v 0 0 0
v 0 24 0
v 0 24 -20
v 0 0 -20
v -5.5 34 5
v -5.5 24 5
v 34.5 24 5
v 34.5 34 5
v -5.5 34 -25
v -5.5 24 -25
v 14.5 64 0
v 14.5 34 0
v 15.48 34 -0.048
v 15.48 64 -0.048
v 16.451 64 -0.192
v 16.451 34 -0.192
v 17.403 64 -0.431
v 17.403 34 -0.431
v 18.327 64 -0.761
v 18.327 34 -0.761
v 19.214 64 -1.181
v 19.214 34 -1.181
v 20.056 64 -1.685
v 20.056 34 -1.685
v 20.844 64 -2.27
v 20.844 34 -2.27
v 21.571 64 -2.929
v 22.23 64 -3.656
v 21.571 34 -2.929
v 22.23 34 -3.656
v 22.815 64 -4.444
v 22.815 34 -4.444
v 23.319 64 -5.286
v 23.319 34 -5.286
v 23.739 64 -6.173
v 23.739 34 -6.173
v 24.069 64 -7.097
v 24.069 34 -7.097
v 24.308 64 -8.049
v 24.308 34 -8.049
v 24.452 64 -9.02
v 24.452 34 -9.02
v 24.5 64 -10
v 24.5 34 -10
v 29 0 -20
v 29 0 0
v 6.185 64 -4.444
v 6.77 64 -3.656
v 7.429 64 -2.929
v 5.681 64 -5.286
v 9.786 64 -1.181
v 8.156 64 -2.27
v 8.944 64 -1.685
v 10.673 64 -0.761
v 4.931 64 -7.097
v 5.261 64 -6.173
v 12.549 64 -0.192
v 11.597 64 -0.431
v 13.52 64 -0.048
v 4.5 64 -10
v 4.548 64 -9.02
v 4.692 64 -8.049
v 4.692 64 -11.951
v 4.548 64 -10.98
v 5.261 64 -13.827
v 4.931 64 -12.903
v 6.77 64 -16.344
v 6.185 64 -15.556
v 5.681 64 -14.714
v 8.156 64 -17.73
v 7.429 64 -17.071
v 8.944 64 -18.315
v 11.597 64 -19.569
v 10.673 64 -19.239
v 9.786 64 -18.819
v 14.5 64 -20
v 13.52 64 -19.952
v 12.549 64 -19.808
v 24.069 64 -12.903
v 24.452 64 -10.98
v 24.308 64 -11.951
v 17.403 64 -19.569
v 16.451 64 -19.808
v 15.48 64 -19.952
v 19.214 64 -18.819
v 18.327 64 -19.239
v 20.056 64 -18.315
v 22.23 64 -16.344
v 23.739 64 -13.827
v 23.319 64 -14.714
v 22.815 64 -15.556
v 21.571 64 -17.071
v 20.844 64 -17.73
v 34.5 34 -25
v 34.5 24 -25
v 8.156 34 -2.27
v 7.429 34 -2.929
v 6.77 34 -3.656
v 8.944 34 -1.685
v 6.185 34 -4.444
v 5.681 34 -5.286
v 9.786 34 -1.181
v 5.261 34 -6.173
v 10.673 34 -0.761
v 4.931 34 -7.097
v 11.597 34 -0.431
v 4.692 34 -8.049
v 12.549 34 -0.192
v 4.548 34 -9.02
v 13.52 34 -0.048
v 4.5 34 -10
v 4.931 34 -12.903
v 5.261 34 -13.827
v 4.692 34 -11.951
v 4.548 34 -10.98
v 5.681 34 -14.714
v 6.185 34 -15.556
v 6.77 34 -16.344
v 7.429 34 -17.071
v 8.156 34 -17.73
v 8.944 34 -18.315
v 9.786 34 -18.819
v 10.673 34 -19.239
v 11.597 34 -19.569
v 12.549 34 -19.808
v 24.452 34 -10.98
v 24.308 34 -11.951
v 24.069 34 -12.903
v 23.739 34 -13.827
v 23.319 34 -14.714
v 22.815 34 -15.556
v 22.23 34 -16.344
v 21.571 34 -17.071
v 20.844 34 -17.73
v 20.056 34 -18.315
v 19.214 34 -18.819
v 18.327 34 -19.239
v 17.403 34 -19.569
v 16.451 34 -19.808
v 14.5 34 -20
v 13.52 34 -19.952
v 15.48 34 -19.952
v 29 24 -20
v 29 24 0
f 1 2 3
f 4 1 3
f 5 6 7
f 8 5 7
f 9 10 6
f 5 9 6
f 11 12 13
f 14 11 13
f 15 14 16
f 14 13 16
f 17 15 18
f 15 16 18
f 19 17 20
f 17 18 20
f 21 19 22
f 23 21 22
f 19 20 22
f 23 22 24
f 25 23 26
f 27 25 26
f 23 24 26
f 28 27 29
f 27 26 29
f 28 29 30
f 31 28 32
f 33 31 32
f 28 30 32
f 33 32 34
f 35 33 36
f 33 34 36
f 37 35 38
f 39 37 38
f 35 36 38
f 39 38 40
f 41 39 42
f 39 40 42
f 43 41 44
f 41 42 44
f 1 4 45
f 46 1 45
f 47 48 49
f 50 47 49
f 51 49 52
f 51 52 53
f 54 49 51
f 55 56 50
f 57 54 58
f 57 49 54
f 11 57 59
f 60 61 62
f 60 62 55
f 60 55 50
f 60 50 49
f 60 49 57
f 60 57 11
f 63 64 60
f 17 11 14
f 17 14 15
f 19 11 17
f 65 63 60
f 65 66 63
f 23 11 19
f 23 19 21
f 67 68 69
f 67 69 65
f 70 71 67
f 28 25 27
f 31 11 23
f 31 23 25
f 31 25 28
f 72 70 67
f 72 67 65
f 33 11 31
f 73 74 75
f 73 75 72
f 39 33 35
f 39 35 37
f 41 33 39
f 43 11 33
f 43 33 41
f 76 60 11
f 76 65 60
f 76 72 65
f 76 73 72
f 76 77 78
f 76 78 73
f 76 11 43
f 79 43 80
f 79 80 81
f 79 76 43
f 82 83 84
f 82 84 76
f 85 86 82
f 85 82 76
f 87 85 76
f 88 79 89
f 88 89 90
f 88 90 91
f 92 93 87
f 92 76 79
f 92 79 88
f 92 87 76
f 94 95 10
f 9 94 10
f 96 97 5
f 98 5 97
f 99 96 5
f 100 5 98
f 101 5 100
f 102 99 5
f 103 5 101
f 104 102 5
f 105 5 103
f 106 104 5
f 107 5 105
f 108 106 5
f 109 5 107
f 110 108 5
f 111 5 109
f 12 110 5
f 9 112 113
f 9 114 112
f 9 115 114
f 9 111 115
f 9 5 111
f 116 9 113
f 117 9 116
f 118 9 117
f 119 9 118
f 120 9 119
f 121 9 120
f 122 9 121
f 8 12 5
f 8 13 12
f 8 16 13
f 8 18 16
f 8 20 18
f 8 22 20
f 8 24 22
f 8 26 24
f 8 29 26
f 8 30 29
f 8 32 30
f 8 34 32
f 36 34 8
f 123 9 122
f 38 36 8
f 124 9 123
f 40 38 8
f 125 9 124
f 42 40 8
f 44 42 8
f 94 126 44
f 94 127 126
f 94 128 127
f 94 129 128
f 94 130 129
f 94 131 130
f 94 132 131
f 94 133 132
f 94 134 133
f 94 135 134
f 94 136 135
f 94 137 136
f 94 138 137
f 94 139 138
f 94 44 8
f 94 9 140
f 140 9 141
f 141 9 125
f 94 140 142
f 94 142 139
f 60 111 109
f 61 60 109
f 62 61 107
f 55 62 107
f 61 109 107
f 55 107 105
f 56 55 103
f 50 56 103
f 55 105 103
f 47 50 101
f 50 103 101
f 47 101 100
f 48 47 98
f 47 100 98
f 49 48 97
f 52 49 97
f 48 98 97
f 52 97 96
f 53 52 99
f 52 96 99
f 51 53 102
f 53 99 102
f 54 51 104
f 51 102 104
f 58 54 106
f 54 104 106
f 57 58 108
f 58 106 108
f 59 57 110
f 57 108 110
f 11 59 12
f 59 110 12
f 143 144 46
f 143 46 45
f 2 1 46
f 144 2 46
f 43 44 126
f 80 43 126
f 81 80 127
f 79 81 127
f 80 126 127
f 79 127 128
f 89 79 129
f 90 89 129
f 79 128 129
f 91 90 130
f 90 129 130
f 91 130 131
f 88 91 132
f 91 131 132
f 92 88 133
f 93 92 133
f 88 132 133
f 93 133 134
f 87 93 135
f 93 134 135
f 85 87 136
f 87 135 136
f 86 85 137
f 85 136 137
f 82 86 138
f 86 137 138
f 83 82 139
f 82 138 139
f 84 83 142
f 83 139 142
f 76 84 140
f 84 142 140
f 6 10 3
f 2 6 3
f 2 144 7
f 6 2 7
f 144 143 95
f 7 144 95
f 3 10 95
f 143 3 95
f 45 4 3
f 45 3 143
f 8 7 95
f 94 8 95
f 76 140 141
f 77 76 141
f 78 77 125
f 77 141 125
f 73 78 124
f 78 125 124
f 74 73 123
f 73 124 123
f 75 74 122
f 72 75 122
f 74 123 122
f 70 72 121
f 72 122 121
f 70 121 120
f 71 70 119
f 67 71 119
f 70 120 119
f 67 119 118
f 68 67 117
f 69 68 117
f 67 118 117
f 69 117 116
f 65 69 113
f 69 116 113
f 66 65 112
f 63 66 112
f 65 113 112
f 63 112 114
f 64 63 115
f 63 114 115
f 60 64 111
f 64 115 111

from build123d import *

# Parameters (mm, degrees)
SKETCH_1_W      = 29
SKETCH_1_H      = 20
EXTRUDE_1_DEPTH = 24
SKETCH_2_W      = 14.5
SKETCH_2_H      = 10
SKETCH_2_W_2    = 5.5
EXTRUDE_2_DEPTH = 10
EXTRUDE_3_DEPTH = 30


with BuildPart() as part:
    # 草图1 → 凸台-拉伸1 (new body)
    with BuildSketch(Plane(origin=(0, 0, 0), x_dir=(1, 0, 0), z_dir=(0, 1, 0))):
        with Locations((14.5, 10)):
            Rectangle(SKETCH_1_W, SKETCH_1_H)
    extrude(amount=EXTRUDE_1_DEPTH)

    # 草图2 → 凸台-拉伸2 (add)
    with BuildSketch(Plane(origin=(0, 24, 0), x_dir=(1, 0, 0), z_dir=(0, 1, 0))):
        with Locations((7.25, 5)):
            Rectangle(SKETCH_2_W, SKETCH_2_H)
        Polygon((0, 0), (0, 10), (0, 20), (14.5, 20), (29, 20), (29, 10), (34.5, 10), (34.5, 25), (-5.5, 25), (-5.5, -5), (34.5, -5), (34.5, 0), (29, 0), (14.5, 0), align=None)
        with Locations((21.75, 5)):
            Rectangle(SKETCH_2_W, SKETCH_2_H)
        with Locations((31.75, 5)):
            Rectangle(SKETCH_2_W_2, SKETCH_2_H)
        with Locations((21.75, 15)):
            Rectangle(SKETCH_2_W, SKETCH_2_H)
        with Locations((7.25, 15)):
            Rectangle(SKETCH_2_W, SKETCH_2_H)
    extrude(amount=EXTRUDE_2_DEPTH)

    # 草图3 → 凸台-拉伸3 (add)
    with BuildSketch(Plane(origin=(0, 34, 0), x_dir=(1, 0, 0), z_dir=(0, 1, 0))):
        with BuildLine():
            ThreePointArc((14.5, 20), (7.428932188, 17.071067812), (4.5, 10))
            Line((4.5, 10), (14.5, 10))
            Line((14.5, 10), (14.5, 20))
        make_face()
        with BuildLine():
            Line((14.5, 10), (4.5, 10))
            ThreePointArc((4.5, 10), (7.428932188, 2.928932188), (14.5, 0))
            Line((14.5, 0), (14.5, 10))
        make_face()
        with BuildLine():
            Line((14.5, 20), (14.5, 10))
            Line((14.5, 10), (24.5, 10))
            ThreePointArc((24.5, 10), (21.571067812, 17.071067812), (14.5, 20))
        make_face()
        with BuildLine():
            Line((24.5, 10), (14.5, 10))
            Line((14.5, 10), (14.5, 0))
            ThreePointArc((14.5, 0), (21.571067812, 2.928932188), (24.5, 10))
        make_face()
    extrude(amount=EXTRUDE_3_DEPTH)


solid = part.part
